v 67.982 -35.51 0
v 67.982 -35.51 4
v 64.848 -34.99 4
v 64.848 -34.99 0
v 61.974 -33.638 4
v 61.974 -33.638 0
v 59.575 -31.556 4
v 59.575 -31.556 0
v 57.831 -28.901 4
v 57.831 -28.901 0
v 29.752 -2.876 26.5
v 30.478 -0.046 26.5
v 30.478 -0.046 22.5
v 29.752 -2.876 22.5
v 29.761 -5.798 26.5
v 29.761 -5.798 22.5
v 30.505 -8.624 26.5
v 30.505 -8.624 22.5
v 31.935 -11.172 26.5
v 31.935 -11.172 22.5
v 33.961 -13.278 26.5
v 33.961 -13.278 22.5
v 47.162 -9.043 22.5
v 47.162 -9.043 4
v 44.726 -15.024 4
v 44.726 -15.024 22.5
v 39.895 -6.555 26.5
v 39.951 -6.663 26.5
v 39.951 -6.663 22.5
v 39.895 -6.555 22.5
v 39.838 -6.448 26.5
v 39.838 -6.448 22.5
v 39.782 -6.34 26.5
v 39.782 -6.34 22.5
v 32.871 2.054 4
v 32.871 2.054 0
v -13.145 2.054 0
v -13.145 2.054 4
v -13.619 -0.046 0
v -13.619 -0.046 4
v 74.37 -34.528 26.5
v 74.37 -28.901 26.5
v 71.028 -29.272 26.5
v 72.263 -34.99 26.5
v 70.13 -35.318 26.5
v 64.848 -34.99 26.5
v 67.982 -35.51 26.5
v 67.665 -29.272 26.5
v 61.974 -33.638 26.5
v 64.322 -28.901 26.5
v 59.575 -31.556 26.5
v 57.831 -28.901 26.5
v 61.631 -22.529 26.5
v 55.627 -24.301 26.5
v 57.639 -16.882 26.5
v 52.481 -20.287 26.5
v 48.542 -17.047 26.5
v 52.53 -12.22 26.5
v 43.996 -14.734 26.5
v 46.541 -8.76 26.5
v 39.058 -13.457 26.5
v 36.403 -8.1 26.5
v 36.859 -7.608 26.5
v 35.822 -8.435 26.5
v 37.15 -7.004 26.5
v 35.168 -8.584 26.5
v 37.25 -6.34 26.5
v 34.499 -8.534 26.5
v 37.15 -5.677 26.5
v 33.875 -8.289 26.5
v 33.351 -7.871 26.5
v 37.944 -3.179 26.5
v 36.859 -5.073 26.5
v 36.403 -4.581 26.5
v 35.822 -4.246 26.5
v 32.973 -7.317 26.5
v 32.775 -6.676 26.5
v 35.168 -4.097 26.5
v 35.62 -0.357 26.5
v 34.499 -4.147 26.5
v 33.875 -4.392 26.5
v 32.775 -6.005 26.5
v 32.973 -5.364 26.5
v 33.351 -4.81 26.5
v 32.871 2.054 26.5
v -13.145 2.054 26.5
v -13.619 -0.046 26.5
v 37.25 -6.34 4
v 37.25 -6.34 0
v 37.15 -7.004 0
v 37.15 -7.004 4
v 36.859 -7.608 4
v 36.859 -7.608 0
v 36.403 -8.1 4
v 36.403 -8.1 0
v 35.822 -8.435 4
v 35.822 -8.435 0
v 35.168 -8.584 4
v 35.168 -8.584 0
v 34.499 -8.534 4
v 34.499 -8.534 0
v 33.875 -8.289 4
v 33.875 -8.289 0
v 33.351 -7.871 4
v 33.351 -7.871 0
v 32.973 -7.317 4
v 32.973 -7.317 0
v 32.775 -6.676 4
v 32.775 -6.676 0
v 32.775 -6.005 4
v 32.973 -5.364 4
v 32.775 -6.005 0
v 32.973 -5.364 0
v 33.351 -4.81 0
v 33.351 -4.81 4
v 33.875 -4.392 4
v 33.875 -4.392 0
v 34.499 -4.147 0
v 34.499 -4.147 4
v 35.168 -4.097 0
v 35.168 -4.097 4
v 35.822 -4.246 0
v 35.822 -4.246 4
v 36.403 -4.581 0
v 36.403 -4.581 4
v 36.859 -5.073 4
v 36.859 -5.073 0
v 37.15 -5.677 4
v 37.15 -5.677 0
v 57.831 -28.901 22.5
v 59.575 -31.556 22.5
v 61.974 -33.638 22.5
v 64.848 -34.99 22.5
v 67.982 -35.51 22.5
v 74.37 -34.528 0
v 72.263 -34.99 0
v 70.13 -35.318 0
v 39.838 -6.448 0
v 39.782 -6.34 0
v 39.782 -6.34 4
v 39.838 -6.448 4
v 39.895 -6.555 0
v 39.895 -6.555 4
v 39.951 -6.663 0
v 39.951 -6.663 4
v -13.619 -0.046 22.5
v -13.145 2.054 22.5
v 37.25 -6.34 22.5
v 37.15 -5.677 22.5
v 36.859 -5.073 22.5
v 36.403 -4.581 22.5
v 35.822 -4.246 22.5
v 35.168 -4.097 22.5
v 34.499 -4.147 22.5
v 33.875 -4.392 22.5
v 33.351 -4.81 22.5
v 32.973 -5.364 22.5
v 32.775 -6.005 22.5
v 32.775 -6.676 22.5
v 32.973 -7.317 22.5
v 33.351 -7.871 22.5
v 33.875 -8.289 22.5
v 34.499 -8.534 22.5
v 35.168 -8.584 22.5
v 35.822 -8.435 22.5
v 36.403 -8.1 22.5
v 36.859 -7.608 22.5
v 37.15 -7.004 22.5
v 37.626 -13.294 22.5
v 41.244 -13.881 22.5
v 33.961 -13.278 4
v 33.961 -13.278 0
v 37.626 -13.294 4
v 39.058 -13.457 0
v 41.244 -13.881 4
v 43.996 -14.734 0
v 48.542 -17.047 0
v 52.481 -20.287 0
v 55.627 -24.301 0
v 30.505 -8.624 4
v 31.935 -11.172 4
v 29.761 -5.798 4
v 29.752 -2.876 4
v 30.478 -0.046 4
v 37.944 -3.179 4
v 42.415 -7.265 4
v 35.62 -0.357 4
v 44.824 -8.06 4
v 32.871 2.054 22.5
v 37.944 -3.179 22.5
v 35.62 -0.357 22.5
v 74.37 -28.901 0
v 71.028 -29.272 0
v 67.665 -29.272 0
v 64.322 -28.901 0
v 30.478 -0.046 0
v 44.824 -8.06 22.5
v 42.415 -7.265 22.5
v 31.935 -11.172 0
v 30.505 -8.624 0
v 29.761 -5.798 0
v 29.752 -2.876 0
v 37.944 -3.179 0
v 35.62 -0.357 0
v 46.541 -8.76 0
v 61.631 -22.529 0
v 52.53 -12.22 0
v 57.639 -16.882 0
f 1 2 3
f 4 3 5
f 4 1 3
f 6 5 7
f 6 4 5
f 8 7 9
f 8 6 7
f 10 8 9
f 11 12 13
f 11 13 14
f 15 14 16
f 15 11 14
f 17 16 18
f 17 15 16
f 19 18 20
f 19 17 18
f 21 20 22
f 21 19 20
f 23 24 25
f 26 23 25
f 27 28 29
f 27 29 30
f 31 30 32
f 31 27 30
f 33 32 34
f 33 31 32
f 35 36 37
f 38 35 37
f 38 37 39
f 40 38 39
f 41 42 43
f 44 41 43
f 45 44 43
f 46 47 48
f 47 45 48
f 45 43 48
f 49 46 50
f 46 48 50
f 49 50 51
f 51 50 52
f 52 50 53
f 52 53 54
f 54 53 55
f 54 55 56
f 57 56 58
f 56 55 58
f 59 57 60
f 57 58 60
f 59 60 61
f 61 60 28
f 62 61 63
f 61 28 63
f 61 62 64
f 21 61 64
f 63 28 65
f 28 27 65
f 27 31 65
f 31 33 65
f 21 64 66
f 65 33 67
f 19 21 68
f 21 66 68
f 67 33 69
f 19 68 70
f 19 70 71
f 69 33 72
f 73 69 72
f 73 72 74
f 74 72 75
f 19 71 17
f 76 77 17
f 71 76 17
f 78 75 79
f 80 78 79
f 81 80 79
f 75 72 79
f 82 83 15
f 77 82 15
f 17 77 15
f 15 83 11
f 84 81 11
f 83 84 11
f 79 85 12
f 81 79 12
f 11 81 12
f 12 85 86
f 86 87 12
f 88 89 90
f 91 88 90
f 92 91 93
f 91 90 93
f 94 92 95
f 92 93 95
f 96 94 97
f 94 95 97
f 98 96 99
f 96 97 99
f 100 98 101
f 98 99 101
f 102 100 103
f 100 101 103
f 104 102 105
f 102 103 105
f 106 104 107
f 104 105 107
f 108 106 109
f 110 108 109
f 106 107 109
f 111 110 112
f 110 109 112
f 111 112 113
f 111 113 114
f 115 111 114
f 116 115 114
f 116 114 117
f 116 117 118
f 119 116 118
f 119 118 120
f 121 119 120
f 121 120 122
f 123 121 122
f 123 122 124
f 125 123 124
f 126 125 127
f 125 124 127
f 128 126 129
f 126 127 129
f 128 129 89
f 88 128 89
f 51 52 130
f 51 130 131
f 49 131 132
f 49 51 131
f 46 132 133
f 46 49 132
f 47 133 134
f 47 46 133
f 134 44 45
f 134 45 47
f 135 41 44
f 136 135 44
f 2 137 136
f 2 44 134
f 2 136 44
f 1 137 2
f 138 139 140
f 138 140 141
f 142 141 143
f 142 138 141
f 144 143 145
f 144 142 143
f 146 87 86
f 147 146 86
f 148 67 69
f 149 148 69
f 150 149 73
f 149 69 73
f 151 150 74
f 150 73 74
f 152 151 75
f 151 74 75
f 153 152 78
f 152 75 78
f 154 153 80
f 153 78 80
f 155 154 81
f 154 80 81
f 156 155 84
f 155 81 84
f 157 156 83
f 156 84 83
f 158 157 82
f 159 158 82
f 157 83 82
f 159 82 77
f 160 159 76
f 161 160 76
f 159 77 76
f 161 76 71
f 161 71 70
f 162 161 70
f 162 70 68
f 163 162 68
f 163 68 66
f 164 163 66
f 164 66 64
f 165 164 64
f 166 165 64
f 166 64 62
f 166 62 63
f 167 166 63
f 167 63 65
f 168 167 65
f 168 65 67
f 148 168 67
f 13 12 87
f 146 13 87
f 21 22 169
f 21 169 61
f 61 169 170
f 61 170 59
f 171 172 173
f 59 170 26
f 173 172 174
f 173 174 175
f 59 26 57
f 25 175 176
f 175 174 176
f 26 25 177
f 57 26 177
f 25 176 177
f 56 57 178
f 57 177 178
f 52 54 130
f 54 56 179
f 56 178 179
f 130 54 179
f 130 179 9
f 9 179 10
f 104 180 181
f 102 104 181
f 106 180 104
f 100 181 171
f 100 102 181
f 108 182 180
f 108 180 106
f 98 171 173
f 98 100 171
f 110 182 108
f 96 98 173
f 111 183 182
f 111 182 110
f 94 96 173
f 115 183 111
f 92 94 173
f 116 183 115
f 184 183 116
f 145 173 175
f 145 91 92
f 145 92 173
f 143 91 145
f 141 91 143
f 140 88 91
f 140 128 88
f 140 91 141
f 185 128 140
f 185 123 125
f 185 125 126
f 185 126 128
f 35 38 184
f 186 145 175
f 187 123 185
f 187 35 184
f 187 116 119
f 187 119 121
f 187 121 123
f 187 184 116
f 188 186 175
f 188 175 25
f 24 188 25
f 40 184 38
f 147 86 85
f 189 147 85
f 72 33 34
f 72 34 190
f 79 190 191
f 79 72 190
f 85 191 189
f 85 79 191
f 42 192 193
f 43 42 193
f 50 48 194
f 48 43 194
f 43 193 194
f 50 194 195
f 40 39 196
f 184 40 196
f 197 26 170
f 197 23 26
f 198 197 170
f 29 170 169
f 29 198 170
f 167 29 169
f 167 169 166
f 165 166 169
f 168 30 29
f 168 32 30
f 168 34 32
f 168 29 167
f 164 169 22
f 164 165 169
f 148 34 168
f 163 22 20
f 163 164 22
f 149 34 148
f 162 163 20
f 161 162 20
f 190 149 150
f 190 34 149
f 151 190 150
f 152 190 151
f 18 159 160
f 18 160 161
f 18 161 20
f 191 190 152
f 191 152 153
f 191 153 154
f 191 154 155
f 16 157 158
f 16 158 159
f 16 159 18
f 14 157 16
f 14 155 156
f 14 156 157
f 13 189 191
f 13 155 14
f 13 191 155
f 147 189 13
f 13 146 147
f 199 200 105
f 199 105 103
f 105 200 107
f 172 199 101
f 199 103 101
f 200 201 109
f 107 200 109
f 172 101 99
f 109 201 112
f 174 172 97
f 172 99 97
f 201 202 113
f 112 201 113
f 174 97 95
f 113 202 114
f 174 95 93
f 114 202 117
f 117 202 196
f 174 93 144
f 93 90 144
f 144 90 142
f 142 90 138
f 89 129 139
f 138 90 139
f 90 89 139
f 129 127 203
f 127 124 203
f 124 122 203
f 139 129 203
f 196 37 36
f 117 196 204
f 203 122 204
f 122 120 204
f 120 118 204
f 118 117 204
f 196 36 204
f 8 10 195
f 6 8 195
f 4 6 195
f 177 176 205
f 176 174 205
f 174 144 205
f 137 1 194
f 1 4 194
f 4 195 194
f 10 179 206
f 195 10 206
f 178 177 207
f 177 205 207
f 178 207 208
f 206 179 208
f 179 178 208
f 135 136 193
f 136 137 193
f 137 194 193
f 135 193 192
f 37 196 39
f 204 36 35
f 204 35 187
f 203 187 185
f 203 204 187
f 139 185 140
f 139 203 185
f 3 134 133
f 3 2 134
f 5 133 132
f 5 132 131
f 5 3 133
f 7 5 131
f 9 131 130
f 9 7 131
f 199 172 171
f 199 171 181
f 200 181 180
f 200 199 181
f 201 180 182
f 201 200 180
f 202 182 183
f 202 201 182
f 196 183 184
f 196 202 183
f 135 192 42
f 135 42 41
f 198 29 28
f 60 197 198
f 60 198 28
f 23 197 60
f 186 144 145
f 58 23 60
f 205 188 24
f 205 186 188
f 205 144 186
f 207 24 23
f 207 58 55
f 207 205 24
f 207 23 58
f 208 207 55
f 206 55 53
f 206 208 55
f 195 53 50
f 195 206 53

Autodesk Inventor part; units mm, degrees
ref_plane "YZ Plane" through (0, 0, 0) normal (1, 0, 0) x (0, 1, 0)
ref_plane "XZ Plane" through (0, 0, 0) normal (0, 1, 0) x (-1, 0, 0)
ref_plane "XY Plane" through (0, 0, 0) normal (0, 0, 1) x (1, 0, 0)
ref_plane "Plan de construction1" through (0, 0, 0) normal (0, 0, 1) x (1, 0, 0)
sketch "Esquisse1" plane through (0, 0, 0) normal (0, 0, 1) x (1, 0, 0)
  arc A0 (39.951, -6.6629) -> (39.7815, -6.3404) centre (-6.5192, -30.8836) ccw
  arc A1 (37.1716, -5.7515) -> (36.5629, -4.7218) centre (-6.5192, -30.8836) ccw
  line L0 (-0.9849, 21.2268) -> (-0.9849, 19.2151)
  circle A2 centre (35, -6.3404) radius 2.25 projected
  circle A3 centre (35, -6.3404) radius 2.25
  line L1 (32.8713, 2.0538) -> (-13.1447, 2.0538)
  line L2 (-13.1447, 2.0538) -> (-13.6192, -0.0461)
  line L3 (-13.6192, -0.0461) -> (30.4775, -0.0461)
  arc A4 (31.5995, 2.0932) -> (31.5733, 2.0538) centre (41.1898, -4.3006) ccw
  arc A5 (30.4775, -0.0461) -> (33.9606, -13.278) centre (41.1898, -4.3006) ccw
  arc A6 (39.7815, -6.3404) -> (32.8713, 2.0538) centre (19.4137, -16.066) ccw
  arc A7 (67.9818, -35.5103) -> (74.3699, -34.5283) centre (66.006, -1.387) ccw
  line L4 (74.3699, -28.9007) -> (74.3699, -34.5283)
  arc A8 (64.3223, -28.9007) -> (39.951, -6.6629) centre (33.5629, -38.1376) ccw
  arc A9 (57.8312, -28.9007) -> (33.9606, -13.278) centre (35.6884, -36.6859) ccw
  arc A10 (57.8312, -28.9007) -> (70.9309, -35.2107) centre (68.2954, -23.9295) ccw
  arc A11 (39.951, -6.6629) -> (39.977, -6.7609) centre (69.3461, 1.0787) ccw
  arc A12 (64.3223, -28.9007) -> (74.3699, -28.9007) centre (69.3461, 1.0787) ccw
  point P0 (0, 0)
  point P1 (32.8713, 3.678)
extrude "Extrusion1" add sketch "Esquisse1" along normal blind 4 contours A8 A12 L4 A7 A10 A9 A5 L3 L2 L1 A6 A0
ref_plane "Plan de construction2" through (0, 0, 13.25) normal (0, 0, 1) x (1, 0, 0)
mirror "Symétrie1" about plane through (0, 0, 13.25) normal (0, 0, 1) of "Extrusion1"
sketch "Esquisse4" plane through (0, 0, 4) normal (0, 0, 1) x (1, 0, 0)
  arc A0 (64.3223, -28.9007) -> (74.3699, -28.9007) centre (69.3461, 1.0787) ccw projected
  line L0 (74.3699, -34.5283) -> (74.3699, -28.9007) projected
  arc A1 (67.9818, -35.5103) -> (74.3699, -34.5283) centre (66.006, -1.387) ccw projected
  arc A2 (57.8312, -28.9007) -> (67.9818, -35.5103) centre (68.2954, -23.9295) ccw projected
  arc A3 (57.8312, -28.9007) -> (33.9606, -13.278) centre (35.6884, -36.6859) ccw projected
  arc A4 (64.3223, -28.9007) -> (39.951, -6.6629) centre (33.5629, -38.1376) ccw projected
  arc A5 (64.3223, -28.9007) -> (39.951, -6.6629) centre (33.5629, -38.1376) ccw projected
  line L1 (47.1623, -9.0426) -> (44.7261, -15.0241)
  arc A6 (57.8312, -28.9007) -> (33.9606, -13.278) centre (35.6884, -36.6859) ccw projected
  point P0 (0, 0)
extrude "Extrusion5" add sketch "Esquisse4" along normal blind 19.25
properties part number "courbe"
